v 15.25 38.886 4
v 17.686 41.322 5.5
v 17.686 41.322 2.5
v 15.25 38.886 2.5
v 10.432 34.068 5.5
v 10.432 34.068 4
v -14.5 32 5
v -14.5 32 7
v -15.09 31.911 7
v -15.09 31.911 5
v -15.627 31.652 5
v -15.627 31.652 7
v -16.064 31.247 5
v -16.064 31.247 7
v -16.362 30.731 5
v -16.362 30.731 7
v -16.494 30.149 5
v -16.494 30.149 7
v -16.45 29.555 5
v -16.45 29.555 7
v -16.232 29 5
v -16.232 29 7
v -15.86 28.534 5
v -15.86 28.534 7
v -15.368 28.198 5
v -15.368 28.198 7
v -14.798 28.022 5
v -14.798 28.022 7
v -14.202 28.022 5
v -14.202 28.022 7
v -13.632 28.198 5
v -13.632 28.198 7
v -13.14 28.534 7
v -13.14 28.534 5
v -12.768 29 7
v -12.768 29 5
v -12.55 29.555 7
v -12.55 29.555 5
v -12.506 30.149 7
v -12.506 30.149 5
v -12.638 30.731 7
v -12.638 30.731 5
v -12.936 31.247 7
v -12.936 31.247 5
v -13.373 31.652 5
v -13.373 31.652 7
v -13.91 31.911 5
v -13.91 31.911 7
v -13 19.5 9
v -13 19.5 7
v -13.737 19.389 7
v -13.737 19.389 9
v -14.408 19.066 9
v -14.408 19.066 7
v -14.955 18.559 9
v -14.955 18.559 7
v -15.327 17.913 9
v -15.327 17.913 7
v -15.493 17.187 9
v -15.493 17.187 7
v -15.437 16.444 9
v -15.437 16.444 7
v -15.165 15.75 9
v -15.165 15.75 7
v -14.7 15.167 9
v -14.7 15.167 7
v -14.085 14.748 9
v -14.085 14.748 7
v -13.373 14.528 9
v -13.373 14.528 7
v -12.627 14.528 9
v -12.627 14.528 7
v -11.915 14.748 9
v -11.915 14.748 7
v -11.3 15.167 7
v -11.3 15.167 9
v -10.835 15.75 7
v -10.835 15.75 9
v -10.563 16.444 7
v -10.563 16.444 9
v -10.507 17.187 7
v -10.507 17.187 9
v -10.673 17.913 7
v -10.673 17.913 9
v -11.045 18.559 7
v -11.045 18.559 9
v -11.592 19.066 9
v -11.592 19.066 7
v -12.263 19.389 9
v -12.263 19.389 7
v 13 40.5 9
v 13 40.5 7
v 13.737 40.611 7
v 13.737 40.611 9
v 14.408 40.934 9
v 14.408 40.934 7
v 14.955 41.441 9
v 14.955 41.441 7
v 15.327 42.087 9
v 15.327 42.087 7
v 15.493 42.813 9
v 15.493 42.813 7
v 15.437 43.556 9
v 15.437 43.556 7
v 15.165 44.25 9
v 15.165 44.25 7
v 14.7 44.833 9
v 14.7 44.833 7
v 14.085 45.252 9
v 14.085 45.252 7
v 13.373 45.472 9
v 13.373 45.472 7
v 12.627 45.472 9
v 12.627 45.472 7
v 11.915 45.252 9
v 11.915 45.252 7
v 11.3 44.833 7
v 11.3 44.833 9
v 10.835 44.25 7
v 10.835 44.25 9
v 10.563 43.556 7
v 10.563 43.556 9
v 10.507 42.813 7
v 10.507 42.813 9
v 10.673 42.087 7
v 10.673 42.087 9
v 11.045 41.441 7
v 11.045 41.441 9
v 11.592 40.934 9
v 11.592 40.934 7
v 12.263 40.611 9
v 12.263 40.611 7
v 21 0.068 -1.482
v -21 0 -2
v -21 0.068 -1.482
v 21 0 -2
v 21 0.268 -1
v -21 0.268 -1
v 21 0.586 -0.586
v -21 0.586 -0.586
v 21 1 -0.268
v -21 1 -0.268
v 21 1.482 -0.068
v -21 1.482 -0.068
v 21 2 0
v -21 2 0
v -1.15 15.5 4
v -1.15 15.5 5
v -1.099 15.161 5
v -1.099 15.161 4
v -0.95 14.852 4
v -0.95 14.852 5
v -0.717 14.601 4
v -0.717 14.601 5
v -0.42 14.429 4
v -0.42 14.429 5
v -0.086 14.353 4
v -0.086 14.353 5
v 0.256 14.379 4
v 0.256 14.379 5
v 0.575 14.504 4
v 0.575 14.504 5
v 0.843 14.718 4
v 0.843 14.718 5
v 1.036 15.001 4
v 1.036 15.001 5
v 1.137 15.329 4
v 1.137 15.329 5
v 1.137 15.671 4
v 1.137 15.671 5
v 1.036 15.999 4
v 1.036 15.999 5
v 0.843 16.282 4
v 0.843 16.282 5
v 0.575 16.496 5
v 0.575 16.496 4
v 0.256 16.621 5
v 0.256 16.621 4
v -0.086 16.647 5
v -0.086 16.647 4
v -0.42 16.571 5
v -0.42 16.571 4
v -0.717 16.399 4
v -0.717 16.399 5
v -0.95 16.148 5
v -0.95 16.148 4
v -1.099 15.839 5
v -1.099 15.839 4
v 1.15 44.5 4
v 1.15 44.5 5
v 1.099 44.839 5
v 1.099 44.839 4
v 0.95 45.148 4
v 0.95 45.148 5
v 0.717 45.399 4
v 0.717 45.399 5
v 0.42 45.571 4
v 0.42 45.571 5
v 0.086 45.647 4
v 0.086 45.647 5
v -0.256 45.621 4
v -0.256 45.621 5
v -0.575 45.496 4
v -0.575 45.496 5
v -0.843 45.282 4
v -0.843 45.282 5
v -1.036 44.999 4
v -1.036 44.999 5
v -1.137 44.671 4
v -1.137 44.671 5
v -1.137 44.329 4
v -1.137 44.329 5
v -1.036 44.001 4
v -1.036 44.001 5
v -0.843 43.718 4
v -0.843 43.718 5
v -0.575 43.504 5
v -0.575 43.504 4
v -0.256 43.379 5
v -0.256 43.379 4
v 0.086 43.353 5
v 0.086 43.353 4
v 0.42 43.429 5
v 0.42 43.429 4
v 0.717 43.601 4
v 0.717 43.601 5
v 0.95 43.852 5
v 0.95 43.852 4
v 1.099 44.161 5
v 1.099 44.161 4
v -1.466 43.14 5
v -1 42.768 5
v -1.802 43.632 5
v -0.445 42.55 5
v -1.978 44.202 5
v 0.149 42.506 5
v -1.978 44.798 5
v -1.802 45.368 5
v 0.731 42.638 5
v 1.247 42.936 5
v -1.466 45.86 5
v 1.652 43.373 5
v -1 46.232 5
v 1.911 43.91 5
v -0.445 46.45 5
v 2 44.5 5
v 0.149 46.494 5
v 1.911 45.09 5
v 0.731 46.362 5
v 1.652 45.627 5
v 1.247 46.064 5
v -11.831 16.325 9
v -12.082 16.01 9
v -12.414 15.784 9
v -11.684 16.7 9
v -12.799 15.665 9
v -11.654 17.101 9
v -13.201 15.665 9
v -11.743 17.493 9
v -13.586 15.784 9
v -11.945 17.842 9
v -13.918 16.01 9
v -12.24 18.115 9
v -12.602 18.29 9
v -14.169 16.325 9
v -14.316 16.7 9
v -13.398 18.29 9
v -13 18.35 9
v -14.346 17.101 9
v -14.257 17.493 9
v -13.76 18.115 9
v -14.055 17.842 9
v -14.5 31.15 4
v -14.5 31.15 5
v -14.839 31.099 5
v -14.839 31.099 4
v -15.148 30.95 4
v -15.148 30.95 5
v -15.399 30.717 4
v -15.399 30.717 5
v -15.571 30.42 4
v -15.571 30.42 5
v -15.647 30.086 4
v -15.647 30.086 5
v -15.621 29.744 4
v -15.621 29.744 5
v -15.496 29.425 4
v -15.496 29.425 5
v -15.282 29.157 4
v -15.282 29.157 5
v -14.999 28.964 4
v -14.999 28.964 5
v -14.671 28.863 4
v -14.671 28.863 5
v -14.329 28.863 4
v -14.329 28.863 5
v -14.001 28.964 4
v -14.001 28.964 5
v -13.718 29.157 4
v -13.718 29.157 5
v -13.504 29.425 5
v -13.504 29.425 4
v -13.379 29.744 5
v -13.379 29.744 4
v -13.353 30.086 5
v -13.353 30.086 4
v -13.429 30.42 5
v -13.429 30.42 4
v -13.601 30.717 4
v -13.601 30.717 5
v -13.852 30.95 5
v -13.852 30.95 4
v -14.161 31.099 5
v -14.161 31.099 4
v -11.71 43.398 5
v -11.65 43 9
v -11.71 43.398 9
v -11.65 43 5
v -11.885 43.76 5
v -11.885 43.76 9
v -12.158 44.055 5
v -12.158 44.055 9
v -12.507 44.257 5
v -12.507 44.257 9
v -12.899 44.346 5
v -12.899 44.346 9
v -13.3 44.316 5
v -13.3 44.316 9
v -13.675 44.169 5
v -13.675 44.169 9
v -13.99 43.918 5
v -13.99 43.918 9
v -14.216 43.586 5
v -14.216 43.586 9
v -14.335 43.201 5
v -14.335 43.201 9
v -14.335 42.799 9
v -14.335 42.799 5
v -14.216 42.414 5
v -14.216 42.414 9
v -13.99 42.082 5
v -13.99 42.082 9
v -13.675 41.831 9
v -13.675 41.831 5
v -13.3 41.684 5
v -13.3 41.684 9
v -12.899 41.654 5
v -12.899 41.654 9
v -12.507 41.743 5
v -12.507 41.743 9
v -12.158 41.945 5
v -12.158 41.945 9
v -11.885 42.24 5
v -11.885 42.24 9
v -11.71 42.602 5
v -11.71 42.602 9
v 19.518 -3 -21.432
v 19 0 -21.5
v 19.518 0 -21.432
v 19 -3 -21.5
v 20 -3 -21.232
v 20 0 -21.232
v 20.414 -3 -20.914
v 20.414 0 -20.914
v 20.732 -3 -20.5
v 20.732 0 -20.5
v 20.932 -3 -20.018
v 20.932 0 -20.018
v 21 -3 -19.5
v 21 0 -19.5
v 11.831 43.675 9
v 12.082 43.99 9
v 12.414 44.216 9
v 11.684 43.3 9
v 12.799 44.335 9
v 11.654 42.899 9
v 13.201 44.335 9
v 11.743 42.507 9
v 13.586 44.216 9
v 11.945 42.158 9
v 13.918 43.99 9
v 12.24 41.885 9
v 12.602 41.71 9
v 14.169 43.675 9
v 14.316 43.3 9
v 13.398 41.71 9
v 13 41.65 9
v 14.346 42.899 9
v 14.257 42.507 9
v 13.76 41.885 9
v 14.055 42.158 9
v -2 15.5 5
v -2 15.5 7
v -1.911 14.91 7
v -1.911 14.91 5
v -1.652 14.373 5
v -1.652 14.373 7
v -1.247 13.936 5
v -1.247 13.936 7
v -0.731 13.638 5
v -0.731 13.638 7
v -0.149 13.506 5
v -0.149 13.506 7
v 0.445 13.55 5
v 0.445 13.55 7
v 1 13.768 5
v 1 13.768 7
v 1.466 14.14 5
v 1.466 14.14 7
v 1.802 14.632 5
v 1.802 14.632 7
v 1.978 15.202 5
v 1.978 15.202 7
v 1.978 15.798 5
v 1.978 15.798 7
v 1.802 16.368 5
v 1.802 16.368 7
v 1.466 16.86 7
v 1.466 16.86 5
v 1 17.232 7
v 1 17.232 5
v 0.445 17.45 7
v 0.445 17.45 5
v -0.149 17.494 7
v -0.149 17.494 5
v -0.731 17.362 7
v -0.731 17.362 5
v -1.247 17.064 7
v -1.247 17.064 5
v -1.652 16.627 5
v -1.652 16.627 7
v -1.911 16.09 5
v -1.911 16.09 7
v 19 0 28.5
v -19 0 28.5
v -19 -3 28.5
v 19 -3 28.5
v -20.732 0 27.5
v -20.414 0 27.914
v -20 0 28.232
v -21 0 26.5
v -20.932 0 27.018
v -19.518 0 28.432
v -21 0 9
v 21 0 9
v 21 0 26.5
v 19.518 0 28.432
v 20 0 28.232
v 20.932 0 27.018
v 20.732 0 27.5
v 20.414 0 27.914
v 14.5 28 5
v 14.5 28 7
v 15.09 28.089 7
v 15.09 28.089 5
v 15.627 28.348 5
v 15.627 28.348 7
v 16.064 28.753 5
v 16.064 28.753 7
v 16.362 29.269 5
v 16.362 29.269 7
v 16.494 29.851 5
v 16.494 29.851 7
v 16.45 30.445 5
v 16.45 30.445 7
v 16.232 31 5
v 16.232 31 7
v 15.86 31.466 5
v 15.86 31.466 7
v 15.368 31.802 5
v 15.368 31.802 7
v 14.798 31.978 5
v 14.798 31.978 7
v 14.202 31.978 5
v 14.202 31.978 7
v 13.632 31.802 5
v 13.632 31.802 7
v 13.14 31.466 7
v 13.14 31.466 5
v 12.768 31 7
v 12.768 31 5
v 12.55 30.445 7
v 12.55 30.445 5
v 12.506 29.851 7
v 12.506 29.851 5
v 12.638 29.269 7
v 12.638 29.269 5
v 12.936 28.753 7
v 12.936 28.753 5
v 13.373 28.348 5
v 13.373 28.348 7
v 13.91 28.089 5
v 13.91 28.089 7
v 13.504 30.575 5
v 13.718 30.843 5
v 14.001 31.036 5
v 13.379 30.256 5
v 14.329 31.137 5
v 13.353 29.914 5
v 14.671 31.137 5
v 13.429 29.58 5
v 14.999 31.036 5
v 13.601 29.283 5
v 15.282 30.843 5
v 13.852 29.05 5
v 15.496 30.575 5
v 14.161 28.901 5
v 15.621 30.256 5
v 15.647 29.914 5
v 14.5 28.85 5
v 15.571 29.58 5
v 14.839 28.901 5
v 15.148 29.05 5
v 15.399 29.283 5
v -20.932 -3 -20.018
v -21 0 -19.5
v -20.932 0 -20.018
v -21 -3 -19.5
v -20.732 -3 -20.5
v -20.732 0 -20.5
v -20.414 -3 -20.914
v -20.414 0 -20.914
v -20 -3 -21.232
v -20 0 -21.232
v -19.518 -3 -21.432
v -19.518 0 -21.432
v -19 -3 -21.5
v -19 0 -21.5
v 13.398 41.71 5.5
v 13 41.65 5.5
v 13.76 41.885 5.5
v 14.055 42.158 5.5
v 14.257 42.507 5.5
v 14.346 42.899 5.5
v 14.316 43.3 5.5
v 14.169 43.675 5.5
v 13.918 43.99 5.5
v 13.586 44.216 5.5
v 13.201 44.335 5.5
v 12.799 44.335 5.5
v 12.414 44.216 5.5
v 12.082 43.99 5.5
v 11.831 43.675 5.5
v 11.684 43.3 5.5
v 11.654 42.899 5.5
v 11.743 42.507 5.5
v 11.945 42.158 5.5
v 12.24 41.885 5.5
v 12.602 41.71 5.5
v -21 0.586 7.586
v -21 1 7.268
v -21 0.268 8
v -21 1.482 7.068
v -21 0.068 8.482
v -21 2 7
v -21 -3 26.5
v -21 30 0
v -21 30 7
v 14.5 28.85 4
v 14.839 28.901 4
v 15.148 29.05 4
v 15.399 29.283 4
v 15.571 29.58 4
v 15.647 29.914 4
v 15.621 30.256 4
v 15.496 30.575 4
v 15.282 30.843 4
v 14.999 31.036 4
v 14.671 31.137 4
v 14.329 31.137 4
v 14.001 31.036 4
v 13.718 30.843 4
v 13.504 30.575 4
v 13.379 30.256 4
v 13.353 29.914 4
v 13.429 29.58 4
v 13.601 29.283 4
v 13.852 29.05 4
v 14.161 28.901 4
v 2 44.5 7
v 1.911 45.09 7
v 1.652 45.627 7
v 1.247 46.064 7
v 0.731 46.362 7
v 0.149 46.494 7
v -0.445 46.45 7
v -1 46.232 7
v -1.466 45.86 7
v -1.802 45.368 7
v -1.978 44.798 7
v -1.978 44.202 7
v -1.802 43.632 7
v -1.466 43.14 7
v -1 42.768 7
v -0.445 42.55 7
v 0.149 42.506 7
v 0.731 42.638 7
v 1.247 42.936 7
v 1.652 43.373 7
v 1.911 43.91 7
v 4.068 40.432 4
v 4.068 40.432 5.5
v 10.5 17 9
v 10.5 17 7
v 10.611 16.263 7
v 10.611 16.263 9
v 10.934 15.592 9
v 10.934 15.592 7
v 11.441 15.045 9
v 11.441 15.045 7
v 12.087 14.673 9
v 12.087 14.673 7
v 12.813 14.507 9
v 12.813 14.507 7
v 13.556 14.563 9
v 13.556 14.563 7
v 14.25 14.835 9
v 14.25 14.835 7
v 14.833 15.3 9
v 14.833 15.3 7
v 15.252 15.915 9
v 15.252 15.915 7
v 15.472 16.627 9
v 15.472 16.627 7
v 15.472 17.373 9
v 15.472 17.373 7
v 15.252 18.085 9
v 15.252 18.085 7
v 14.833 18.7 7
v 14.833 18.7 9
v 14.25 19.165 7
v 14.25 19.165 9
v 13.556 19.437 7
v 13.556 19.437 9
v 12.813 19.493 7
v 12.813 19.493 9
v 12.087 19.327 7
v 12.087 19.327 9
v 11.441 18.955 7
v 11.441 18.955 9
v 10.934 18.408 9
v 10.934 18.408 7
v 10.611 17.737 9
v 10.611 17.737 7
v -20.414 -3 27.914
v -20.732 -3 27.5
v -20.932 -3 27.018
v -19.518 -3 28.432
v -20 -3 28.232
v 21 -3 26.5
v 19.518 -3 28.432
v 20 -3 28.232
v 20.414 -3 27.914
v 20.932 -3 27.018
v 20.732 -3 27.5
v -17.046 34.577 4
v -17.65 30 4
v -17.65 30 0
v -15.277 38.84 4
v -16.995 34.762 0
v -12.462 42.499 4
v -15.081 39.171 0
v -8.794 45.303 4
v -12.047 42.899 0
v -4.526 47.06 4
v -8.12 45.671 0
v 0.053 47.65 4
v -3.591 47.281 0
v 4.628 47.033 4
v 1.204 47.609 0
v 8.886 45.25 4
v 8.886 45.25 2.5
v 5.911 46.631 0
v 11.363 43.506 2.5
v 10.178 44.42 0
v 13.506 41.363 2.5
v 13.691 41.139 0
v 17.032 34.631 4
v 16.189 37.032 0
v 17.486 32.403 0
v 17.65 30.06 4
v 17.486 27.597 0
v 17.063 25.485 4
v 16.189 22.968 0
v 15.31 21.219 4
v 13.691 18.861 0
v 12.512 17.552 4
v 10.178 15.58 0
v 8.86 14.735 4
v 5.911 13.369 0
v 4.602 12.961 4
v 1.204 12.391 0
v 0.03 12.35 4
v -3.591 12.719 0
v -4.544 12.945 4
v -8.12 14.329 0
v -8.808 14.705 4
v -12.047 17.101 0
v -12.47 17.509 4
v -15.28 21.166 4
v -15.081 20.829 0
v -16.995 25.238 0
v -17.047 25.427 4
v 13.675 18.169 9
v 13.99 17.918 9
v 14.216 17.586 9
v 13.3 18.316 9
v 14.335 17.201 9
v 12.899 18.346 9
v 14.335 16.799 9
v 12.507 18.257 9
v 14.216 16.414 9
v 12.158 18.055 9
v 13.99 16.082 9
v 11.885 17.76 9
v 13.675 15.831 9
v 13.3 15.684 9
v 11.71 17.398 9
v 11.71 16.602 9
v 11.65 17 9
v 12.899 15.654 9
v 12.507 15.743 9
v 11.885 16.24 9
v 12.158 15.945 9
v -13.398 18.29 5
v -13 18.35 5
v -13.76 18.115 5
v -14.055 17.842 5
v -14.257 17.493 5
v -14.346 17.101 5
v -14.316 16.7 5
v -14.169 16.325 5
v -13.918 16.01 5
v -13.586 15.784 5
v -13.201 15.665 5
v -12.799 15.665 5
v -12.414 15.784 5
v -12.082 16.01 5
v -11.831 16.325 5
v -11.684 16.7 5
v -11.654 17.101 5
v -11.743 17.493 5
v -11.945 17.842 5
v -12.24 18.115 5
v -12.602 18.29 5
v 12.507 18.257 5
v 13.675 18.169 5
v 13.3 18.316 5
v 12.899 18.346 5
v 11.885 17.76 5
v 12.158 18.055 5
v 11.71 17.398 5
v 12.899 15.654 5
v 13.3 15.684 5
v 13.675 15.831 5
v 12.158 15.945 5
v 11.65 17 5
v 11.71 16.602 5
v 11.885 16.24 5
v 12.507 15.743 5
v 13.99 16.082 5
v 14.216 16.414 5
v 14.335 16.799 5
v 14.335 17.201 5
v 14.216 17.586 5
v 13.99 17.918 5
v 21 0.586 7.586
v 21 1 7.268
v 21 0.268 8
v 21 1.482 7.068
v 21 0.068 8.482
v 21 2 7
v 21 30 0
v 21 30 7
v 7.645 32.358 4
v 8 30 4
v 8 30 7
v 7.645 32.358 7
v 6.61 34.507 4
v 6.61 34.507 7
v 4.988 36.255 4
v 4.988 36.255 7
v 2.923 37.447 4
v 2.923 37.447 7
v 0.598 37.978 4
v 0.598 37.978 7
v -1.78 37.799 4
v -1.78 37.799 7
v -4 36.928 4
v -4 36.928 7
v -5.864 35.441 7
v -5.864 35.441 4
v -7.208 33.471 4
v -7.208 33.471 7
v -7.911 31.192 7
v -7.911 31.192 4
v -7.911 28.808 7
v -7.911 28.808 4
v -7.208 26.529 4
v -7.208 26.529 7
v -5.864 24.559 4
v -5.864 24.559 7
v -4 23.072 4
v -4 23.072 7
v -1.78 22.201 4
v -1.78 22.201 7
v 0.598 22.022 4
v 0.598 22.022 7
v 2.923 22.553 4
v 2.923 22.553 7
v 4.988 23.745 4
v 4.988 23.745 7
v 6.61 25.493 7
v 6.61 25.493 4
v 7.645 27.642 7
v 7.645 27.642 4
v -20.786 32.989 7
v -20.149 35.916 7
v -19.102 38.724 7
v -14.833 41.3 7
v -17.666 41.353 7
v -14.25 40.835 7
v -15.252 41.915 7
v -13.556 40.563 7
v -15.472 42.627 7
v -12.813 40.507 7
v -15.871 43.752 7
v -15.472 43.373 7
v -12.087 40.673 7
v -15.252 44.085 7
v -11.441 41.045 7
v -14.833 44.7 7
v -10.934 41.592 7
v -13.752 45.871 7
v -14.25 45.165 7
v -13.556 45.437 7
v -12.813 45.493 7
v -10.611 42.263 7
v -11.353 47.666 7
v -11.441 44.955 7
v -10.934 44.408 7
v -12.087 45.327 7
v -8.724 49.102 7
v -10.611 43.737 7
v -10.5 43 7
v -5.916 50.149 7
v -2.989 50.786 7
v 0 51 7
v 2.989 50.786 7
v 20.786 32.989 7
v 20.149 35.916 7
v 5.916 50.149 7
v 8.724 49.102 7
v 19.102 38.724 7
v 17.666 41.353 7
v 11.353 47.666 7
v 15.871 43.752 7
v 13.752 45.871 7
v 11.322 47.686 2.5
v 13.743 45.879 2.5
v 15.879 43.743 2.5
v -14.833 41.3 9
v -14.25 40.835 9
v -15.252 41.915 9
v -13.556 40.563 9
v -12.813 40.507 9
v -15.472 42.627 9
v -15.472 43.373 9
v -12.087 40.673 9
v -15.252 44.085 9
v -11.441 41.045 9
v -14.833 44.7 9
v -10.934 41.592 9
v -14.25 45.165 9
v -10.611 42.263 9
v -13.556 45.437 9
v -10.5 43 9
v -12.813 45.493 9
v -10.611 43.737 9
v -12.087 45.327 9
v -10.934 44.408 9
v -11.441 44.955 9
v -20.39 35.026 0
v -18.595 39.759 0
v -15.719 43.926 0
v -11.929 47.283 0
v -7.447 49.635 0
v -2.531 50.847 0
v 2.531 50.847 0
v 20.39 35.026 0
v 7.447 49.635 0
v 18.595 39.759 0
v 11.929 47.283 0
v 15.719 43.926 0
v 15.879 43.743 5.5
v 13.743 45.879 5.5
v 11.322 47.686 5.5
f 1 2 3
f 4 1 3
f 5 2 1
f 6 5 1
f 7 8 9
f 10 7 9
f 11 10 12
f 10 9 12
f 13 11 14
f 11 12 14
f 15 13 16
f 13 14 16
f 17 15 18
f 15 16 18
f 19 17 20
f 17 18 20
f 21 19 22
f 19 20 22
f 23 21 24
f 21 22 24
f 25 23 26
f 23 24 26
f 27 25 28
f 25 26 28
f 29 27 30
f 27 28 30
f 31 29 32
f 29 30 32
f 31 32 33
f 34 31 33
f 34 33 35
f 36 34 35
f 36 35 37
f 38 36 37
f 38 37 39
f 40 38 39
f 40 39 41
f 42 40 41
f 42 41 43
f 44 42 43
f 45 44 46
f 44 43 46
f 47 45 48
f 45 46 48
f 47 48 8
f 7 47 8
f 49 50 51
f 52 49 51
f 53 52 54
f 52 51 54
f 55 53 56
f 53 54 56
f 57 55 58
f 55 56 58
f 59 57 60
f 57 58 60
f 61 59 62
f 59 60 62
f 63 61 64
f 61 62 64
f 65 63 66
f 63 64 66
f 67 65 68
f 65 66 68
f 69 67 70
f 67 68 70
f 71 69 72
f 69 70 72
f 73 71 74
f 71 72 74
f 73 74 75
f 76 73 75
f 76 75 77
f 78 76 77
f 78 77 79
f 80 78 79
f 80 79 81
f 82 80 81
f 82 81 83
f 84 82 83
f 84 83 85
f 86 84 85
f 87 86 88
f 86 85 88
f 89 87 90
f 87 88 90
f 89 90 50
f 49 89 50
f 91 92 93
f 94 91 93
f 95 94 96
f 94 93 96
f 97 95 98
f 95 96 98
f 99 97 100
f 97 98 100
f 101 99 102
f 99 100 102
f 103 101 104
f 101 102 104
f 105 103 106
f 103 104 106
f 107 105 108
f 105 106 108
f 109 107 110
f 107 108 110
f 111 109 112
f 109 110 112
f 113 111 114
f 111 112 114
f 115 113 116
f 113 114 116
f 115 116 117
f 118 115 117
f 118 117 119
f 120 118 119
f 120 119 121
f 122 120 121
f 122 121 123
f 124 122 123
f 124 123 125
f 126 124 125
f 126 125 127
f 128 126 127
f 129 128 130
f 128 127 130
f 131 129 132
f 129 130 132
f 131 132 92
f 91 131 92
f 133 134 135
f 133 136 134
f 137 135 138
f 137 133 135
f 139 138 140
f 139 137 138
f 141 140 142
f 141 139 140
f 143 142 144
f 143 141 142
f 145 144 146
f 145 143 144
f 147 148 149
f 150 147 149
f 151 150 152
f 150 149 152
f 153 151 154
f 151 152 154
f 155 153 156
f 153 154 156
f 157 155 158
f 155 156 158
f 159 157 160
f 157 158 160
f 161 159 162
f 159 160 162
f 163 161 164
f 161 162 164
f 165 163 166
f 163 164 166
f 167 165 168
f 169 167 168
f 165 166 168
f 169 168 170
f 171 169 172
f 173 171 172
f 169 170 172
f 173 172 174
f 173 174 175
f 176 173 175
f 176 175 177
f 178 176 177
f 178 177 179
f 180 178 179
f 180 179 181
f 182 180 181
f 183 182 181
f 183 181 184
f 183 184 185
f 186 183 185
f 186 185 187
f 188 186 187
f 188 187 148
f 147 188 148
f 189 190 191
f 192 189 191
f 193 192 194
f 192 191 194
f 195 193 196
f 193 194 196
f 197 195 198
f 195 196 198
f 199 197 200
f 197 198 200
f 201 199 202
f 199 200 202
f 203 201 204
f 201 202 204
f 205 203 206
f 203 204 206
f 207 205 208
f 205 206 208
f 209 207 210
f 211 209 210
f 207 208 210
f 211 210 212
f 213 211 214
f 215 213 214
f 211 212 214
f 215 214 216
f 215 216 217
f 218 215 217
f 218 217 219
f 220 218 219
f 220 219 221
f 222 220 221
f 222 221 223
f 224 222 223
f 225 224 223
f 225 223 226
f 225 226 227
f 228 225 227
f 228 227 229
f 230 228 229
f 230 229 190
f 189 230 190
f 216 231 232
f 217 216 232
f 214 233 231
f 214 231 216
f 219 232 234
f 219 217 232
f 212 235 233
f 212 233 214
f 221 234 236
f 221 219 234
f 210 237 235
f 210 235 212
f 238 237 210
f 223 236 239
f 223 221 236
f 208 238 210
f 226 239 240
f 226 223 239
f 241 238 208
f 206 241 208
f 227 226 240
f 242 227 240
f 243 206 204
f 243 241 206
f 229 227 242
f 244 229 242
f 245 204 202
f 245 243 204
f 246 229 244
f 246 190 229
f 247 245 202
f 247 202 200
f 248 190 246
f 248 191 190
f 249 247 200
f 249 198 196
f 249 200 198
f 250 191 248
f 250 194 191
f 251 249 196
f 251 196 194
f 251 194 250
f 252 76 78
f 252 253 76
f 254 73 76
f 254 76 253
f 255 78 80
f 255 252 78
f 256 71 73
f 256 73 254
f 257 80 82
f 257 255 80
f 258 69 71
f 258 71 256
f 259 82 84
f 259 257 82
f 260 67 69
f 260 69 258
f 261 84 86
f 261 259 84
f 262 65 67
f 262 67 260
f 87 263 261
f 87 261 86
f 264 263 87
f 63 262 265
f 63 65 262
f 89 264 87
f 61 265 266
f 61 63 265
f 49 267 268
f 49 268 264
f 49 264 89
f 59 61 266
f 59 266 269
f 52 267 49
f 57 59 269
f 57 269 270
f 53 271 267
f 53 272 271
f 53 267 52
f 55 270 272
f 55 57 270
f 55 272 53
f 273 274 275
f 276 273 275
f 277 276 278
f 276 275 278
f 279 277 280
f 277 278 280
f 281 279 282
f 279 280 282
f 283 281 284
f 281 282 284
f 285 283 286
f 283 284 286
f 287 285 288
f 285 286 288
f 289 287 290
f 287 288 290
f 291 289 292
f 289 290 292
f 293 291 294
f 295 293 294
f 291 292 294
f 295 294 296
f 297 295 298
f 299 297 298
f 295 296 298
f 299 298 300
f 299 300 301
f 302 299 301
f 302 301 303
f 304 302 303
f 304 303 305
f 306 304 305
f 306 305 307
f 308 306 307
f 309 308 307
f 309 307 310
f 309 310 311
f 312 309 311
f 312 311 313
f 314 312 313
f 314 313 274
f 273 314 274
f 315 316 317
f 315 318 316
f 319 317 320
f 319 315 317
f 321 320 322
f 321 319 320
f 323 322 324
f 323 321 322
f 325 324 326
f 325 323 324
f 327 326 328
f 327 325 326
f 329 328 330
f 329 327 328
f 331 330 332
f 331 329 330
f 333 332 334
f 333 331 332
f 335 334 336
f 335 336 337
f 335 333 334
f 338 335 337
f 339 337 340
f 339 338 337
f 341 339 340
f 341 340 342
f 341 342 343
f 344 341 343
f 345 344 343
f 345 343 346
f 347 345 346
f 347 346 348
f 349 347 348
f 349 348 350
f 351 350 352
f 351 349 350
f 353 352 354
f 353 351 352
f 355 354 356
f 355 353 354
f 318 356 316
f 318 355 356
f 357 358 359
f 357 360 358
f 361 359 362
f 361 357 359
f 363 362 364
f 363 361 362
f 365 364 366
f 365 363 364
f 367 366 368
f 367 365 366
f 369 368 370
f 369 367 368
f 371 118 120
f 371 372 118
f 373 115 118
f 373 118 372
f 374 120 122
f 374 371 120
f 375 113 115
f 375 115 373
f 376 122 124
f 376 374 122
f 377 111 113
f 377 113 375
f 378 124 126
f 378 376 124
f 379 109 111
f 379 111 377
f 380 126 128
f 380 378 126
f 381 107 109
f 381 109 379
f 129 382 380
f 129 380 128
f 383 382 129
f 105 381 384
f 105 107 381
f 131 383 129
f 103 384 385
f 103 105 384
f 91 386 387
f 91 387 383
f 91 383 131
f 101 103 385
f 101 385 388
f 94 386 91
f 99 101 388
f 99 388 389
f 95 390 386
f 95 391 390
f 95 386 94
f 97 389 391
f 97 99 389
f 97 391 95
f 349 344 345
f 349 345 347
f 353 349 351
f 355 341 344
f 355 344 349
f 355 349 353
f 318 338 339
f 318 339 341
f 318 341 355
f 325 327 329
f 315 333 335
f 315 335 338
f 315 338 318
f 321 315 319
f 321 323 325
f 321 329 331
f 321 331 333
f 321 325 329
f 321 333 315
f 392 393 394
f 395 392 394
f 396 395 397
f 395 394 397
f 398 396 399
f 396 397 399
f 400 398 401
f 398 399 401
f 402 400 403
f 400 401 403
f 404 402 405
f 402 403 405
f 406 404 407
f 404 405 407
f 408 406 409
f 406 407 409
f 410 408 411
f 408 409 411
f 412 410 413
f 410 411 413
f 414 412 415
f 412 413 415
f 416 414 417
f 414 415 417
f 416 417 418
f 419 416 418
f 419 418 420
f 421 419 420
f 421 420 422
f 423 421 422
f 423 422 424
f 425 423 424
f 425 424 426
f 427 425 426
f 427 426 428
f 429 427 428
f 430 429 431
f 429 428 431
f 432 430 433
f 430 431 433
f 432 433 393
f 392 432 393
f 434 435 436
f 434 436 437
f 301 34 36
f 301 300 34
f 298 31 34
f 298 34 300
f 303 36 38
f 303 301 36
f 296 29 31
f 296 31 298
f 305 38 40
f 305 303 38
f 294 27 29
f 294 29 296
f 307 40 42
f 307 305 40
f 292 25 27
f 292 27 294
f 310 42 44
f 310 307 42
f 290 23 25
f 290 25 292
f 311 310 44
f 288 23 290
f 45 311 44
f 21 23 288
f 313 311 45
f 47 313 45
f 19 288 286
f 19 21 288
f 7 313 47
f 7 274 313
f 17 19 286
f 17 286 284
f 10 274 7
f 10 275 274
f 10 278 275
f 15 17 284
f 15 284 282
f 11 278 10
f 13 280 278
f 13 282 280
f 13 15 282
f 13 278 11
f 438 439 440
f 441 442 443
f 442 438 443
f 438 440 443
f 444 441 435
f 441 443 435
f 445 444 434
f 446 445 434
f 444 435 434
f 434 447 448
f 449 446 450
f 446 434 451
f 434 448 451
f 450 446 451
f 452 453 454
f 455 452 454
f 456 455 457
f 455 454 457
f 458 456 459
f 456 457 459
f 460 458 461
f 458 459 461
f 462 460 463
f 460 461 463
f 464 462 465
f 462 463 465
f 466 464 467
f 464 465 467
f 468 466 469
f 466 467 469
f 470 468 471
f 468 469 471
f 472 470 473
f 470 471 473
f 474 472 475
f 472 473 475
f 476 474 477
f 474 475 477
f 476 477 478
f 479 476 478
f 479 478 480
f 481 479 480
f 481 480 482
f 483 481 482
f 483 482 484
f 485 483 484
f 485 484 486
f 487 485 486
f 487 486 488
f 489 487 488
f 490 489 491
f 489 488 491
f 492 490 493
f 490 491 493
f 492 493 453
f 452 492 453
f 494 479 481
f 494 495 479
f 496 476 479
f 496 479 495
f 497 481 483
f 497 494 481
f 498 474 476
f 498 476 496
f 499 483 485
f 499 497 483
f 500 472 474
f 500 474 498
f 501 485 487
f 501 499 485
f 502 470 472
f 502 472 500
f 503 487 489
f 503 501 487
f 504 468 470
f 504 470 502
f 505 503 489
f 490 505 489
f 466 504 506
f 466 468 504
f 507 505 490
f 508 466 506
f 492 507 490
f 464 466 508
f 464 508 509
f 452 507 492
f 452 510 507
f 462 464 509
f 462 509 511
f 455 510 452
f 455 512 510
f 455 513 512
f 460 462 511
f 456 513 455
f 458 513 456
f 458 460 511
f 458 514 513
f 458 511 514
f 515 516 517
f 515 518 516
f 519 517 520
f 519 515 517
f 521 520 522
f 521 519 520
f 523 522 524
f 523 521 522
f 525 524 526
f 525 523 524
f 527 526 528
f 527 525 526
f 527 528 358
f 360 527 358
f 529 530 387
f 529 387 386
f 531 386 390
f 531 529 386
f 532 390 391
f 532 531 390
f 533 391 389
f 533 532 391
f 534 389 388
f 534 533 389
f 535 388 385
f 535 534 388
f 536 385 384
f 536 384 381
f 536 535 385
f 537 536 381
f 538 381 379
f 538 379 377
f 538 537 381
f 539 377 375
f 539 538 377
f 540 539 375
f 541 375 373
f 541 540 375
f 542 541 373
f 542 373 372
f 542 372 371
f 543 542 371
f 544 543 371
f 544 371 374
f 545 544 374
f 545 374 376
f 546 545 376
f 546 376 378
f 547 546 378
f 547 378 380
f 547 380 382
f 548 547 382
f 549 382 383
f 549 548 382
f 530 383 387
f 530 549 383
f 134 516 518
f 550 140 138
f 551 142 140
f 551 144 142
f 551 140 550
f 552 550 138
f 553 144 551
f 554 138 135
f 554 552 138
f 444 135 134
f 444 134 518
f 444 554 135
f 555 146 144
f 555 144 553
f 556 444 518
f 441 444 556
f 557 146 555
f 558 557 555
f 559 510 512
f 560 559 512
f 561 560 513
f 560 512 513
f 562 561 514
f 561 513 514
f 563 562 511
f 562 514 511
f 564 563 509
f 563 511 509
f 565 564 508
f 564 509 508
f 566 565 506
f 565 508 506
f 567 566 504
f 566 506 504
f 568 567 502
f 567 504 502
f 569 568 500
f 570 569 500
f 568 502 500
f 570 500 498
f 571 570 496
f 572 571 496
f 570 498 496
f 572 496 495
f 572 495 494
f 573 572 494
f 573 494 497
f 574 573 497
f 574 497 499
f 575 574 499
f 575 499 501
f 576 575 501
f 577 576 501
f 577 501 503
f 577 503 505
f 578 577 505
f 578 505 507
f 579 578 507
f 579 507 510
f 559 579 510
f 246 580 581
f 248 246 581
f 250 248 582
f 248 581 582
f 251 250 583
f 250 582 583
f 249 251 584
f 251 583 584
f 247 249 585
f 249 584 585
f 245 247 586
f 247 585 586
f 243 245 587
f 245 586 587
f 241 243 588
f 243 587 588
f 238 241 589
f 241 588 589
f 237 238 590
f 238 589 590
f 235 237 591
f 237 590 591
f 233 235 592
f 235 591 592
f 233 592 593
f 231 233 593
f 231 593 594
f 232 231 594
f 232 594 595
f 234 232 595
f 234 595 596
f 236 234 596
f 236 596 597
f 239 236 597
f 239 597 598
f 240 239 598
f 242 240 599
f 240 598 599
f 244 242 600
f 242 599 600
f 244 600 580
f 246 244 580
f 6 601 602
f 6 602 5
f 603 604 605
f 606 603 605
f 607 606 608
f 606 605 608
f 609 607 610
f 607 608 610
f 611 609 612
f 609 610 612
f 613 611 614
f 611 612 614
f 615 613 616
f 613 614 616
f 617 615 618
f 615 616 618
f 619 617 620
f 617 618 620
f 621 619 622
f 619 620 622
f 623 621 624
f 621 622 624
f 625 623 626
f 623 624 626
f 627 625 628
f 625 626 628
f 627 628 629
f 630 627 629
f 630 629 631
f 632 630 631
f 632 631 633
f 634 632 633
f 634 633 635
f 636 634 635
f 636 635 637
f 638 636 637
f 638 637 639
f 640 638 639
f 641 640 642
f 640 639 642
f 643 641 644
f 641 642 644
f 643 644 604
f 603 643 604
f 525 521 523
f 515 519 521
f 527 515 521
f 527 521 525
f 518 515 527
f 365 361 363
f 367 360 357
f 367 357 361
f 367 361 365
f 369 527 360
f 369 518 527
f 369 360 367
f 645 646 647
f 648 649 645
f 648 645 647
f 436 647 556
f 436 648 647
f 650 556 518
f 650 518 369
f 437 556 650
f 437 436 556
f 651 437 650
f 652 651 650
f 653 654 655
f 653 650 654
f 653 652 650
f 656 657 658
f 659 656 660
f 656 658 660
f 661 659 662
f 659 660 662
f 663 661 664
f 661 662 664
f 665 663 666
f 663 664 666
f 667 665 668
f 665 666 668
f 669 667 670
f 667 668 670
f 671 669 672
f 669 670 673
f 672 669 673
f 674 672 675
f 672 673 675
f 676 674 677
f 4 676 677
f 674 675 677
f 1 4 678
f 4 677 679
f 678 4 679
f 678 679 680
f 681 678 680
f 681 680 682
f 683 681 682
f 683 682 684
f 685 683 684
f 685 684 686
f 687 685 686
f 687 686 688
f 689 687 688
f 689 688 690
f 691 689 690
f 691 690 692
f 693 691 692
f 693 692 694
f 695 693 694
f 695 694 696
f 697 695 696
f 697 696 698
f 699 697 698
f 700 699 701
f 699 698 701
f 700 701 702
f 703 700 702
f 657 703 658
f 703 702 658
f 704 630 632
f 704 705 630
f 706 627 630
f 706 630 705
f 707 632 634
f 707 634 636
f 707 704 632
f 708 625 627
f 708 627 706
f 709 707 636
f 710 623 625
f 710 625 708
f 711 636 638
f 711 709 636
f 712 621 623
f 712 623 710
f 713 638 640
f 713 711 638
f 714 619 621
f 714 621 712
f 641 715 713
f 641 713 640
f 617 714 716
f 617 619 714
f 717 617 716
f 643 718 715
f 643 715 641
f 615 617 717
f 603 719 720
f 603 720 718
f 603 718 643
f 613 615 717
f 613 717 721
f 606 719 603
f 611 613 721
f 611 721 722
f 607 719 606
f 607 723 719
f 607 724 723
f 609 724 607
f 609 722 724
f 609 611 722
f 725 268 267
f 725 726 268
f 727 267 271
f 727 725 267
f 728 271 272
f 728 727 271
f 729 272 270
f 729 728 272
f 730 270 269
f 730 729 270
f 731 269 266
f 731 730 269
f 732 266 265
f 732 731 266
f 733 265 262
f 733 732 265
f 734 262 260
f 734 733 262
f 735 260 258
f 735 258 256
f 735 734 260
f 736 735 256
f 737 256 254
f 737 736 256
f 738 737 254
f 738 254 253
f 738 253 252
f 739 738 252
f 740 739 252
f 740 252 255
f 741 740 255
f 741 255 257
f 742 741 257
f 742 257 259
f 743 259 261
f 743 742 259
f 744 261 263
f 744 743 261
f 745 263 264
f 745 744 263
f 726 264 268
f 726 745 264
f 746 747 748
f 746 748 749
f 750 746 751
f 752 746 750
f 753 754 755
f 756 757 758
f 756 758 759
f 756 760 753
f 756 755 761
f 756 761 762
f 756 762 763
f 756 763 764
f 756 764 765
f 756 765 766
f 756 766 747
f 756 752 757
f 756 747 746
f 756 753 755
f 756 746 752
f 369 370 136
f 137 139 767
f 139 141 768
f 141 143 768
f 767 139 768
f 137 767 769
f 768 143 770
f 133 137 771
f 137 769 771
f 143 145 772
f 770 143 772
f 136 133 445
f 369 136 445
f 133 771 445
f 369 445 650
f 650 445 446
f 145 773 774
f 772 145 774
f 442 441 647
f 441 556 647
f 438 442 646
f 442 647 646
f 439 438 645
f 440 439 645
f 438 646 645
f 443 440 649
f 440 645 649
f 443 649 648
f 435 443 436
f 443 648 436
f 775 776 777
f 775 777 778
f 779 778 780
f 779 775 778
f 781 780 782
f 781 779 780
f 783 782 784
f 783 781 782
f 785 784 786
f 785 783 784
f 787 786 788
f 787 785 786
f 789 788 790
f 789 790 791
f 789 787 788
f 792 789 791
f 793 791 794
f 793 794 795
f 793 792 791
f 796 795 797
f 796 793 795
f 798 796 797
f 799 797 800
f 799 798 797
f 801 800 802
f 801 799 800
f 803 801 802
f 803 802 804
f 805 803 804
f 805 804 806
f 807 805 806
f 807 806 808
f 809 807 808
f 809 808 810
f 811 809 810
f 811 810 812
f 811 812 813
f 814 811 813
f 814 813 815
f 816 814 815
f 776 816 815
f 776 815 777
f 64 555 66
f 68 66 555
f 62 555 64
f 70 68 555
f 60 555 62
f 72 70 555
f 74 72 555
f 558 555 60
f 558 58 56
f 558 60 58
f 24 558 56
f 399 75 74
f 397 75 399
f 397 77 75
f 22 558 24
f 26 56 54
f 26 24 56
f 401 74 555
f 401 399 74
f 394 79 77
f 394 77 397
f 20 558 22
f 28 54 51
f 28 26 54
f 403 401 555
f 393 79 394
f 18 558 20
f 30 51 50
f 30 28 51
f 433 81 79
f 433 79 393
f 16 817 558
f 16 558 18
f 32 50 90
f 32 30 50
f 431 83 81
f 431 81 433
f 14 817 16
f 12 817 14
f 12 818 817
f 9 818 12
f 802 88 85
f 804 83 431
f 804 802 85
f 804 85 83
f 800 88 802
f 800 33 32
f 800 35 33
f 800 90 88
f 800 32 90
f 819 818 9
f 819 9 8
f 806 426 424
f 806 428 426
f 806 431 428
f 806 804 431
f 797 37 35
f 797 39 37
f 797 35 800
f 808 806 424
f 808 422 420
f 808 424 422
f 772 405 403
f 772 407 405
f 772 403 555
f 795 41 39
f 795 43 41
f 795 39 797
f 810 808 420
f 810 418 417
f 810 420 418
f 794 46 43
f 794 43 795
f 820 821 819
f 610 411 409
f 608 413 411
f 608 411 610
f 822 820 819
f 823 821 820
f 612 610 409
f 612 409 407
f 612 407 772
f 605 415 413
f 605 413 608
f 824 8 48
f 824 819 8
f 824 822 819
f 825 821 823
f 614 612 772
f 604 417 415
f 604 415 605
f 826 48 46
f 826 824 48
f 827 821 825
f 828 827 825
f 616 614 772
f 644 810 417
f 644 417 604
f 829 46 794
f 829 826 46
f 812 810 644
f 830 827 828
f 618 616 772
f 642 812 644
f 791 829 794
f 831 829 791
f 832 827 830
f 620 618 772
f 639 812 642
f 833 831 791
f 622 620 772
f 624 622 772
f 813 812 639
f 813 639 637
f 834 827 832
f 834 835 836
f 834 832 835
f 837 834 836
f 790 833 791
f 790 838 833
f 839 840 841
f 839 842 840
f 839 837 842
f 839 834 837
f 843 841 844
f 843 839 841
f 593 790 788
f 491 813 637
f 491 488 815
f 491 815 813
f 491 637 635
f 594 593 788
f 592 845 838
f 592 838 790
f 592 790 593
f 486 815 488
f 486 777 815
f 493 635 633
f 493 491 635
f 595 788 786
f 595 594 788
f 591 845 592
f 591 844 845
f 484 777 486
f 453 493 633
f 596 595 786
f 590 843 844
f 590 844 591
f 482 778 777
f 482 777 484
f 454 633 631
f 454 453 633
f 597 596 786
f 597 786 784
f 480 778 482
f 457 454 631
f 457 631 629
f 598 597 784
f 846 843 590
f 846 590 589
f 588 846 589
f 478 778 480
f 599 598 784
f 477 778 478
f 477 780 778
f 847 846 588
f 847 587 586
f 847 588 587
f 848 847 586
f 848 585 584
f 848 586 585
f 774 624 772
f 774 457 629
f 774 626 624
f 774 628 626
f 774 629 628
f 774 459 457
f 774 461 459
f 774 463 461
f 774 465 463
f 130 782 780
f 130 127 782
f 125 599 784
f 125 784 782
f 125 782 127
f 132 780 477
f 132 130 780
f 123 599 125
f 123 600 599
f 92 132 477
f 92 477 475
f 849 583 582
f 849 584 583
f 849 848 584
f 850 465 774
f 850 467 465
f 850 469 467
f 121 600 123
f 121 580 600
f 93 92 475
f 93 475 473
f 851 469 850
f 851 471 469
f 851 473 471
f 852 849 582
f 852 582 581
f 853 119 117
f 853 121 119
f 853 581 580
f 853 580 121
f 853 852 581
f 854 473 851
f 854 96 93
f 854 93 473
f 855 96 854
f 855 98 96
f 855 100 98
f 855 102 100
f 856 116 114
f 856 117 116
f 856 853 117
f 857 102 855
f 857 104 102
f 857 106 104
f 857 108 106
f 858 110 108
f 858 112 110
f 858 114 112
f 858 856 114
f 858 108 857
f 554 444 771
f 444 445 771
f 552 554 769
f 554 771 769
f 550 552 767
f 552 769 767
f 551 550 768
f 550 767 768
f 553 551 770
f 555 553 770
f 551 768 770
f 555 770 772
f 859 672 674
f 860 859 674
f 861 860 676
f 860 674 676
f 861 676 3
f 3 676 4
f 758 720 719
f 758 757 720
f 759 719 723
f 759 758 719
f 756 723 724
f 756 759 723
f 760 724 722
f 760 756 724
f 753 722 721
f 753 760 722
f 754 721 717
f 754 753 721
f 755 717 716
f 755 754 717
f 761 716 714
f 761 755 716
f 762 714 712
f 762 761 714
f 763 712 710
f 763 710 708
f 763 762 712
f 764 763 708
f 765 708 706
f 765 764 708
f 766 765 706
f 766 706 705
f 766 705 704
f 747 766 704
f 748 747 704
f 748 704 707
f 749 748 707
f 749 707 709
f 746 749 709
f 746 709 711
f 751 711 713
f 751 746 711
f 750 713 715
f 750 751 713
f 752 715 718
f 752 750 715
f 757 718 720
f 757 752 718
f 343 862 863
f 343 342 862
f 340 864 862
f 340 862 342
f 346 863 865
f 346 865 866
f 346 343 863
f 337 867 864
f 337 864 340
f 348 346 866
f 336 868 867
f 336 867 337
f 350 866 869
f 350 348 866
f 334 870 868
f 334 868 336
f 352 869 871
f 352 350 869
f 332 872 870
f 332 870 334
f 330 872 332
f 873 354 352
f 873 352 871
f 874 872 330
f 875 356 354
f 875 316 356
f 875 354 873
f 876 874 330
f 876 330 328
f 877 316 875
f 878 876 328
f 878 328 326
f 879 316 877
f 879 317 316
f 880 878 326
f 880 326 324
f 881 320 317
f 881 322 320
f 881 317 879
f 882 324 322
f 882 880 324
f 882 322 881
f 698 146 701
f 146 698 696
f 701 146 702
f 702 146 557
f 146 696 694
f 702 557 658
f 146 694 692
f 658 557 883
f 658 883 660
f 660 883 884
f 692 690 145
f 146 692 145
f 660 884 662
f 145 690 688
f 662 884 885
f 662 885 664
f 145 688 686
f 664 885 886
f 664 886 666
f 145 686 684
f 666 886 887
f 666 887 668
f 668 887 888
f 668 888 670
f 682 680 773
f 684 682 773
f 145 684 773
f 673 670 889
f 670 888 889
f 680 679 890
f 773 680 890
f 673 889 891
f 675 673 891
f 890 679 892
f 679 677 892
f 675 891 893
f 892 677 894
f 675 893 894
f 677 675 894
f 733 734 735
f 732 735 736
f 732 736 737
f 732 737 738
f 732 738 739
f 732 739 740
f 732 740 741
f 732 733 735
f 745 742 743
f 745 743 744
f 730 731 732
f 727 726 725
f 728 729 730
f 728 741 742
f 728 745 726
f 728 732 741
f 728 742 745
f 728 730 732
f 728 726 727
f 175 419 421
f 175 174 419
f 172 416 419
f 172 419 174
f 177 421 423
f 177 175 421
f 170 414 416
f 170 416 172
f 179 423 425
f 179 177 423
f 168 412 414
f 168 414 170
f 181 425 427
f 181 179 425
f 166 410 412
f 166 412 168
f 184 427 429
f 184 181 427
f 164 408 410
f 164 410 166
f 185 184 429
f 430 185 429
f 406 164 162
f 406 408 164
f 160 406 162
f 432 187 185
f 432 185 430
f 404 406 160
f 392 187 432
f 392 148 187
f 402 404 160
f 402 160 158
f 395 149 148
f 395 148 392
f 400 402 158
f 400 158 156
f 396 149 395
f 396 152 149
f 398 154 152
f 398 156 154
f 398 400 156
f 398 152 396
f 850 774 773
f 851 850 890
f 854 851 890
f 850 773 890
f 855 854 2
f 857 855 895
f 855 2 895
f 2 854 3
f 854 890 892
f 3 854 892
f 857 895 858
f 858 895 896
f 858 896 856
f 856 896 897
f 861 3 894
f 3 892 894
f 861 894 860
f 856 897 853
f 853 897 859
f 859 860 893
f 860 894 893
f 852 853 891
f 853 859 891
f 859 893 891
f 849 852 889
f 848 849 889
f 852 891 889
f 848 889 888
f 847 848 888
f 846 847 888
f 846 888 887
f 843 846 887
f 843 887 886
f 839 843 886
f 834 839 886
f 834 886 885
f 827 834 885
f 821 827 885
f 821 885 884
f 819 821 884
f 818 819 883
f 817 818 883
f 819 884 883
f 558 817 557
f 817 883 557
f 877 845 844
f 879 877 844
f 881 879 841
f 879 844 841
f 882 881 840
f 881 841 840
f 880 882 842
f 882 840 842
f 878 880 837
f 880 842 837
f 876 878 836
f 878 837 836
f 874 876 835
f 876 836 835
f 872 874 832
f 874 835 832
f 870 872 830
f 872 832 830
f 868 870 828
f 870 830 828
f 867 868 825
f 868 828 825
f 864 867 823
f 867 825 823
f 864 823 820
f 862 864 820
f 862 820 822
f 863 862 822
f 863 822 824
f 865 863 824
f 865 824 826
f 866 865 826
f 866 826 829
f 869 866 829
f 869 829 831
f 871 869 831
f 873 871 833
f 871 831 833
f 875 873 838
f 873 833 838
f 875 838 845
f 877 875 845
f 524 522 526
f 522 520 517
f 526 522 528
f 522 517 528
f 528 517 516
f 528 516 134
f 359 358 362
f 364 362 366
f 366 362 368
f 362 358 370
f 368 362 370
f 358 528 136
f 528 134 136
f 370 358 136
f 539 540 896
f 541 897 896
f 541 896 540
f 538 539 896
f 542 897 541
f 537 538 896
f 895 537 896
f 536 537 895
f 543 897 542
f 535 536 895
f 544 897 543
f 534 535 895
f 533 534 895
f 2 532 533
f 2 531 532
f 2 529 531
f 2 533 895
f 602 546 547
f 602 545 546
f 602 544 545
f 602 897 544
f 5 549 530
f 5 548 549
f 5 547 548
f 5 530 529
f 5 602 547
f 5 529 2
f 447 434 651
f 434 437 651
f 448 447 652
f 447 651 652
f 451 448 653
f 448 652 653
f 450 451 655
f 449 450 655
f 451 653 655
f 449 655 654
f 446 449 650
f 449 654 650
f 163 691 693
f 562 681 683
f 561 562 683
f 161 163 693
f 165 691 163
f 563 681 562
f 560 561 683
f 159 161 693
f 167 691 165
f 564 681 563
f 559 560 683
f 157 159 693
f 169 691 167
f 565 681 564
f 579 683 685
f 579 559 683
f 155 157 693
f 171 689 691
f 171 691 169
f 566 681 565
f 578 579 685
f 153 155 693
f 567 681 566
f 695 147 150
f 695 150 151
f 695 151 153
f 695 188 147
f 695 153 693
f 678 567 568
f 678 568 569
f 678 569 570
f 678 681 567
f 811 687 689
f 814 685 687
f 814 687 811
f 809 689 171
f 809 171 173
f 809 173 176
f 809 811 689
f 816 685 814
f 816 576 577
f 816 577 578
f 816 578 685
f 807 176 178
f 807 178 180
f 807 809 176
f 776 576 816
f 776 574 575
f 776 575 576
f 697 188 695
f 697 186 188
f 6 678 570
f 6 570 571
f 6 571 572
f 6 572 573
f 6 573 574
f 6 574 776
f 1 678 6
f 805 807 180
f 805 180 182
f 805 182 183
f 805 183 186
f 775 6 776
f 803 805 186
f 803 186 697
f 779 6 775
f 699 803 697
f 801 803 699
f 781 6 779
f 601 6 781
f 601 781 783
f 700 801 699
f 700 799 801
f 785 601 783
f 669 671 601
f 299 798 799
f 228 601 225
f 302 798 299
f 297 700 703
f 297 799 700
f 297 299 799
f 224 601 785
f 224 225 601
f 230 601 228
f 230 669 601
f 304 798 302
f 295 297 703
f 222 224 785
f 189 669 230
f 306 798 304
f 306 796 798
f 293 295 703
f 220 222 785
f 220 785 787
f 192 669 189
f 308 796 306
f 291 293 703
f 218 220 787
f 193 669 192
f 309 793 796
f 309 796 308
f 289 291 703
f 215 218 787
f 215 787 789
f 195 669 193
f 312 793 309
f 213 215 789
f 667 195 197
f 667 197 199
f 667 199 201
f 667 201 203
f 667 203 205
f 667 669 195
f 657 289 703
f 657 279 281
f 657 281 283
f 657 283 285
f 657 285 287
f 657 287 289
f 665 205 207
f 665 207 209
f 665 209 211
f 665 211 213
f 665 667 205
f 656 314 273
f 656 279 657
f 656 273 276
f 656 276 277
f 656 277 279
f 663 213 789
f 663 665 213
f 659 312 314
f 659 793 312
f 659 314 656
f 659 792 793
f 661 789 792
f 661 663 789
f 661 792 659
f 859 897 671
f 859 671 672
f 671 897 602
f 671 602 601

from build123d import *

# Parameters (mm, degrees)
SKETCH1_R           = 8
BOSS_EXTRUDE1_DEPTH = 7
SKETCH2_R           = 17.65
CUT_EXTRUDE1_DEPTH  = 4
CUT_EXTRUDE2_REACH  = 57.597
SKETCH4_R           = 1.15
SKETCH5_R           = 2
CUT_EXTRUDE3_DEPTH  = 2
SKETCH6_R           = 2.5
SKETCH6_R_2         = 1.35
BOSS_EXTRUDE2_DEPTH = 2
CUT_EXTRUDE4_START  = -2
SKETCH6_2_R         = 1.35
CUT_EXTRUDE4_DEPTH  = 2
CIRPATTERN3_COUNT   = 4
SKETCH7_W           = 42
SKETCH7_H           = 50
BOSS_EXTRUDE3_DEPTH = 3
FILLET1_R           = 2
CUT_EXTRUDE5_REACH  = 61.24
SKETCH8_W           = 9
SKETCH8_H           = 3


with BuildPart() as part:
    # Sketch1 → Boss-Extrude1 (new body)
    with BuildSketch(Plane.XY):
        with BuildLine():
            Line((-21, 0), (21, 0))
            Line((21, 0), (21, 30))
            ThreePointArc((21, 30), (0, 51), (-21, 30))
            Line((-21, 30), (-21, 0))
        make_face()
        with Locations((0, 30)):
            Circle(SKETCH1_R, mode=Mode.SUBTRACT)
    extrude(amount=BOSS_EXTRUDE1_DEPTH)

    # Sketch2 → Cut-Extrude1 (cut)
    with BuildSketch(Plane(origin=(0, 0, 0), x_dir=(-1, 0, 0), z_dir=(0, 0, -1))):
        with Locations((0, 30)):
            Circle(SKETCH2_R)
    extrude(amount=-CUT_EXTRUDE1_DEPTH, mode=Mode.SUBTRACT)

    # Sketch4 → Cut-Extrude2 (cut, up to next)
    with BuildSketch(Plane.XY.offset(7), mode=Mode.PRIVATE) as cut_extrude2_sk1:
        with Locations((0, 44.5)):
            Circle(SKETCH4_R)
    cut_extrude2_tool1 = extrude(cut_extrude2_sk1.sketch, amount=-CUT_EXTRUDE2_REACH, mode=Mode.PRIVATE) & part.part
    cut_extrude2 = cut_extrude2_tool1.solids().sort_by_distance((0, 44.5, 7))[0]
    add(cut_extrude2, mode=Mode.SUBTRACT)

    # Sketch5 → Cut-Extrude3 (cut)
    with BuildSketch(Plane.XY.offset(7)):
        with Locations((0, 44.5)):
            Circle(SKETCH5_R)
    cut_extrude3 = extrude(amount=-CUT_EXTRUDE3_DEPTH, mode=Mode.SUBTRACT)

    # Sketch6 → Boss-Extrude2 (add)
    with BuildSketch(Plane.XY.offset(7)):
        with Locations((-13, 43)):
            Circle(SKETCH6_R)
        with Locations((-13, 43)):
            Circle(SKETCH6_R_2, mode=Mode.SUBTRACT)
    boss_extrude2 = extrude(amount=BOSS_EXTRUDE2_DEPTH)

    # Sketch6<2> → Cut-Extrude4 (cut)
    with BuildSketch(Plane.XY.offset(7).offset(CUT_EXTRUDE4_START)):
        with Locations((-13, 43)):
            Circle(SKETCH6_2_R)
    cut_extrude4 = extrude(amount=CUT_EXTRUDE4_DEPTH, mode=Mode.SUBTRACT)

    # CirPattern3: Cut-Extrude2, Cut-Extrude3, Boss-Extrude2, Cut-Extrude4 ×4 about axis
    cirpattern3_axis = Axis((0, 30, 7), (0, 0, -1))
    add([cut_extrude2.rotate(cirpattern3_axis, i * 360 / CIRPATTERN3_COUNT) for i in range(1, CIRPATTERN3_COUNT)], mode=Mode.SUBTRACT)
    add([cut_extrude3.rotate(cirpattern3_axis, i * 360 / CIRPATTERN3_COUNT) for i in range(1, CIRPATTERN3_COUNT)], mode=Mode.SUBTRACT)
    add([boss_extrude2.rotate(cirpattern3_axis, i * 360 / CIRPATTERN3_COUNT) for i in range(1, CIRPATTERN3_COUNT)])
    add([cut_extrude4.rotate(cirpattern3_axis, i * 360 / CIRPATTERN3_COUNT) for i in range(1, CIRPATTERN3_COUNT)], mode=Mode.SUBTRACT)

    # Sketch7 → Boss-Extrude3 (add)
    with BuildSketch(Plane.XZ):
        with Locations((0, 3.5)):
            Rectangle(SKETCH7_W, SKETCH7_H)
    extrude(amount=BOSS_EXTRUDE3_DEPTH)

    # Fillet1
    fillet1_edges = [part.edges().sort_by_distance(p)[0] for p in [
        (0, 0, 7),
        (0, 0, 0),
        (21, -1.5, -21.5),
        (-21, -1.5, -21.5),
        (21, -1.5, 28.5),
        (-21, -1.5, 28.5),
    ]]
    fillet(fillet1_edges, radius=FILLET1_R)

    # Sketch8 → Cut-Extrude5 (cut, up to next)
    with BuildSketch(Plane(origin=(22.25, 22.25, 0), x_dir=(0.7071067811865513, -0.7071067811865437, 0), z_dir=(0.7071067811865437, 0.7071067811865513, 0)), mode=Mode.PRIVATE) as cut_extrude5_sk1:
        with Locations((-21.213203436, -4)):
            Rectangle(SKETCH8_W, SKETCH8_H)
    cut_extrude5_tool1 = extrude(cut_extrude5_sk1.sketch, amount=CUT_EXTRUDE5_REACH, mode=Mode.PRIVATE) & part.part
    add(cut_extrude5_tool1.solids().sort_by_distance((7.25, 37.25, 4))[0], mode=Mode.SUBTRACT)


solid = part.part
